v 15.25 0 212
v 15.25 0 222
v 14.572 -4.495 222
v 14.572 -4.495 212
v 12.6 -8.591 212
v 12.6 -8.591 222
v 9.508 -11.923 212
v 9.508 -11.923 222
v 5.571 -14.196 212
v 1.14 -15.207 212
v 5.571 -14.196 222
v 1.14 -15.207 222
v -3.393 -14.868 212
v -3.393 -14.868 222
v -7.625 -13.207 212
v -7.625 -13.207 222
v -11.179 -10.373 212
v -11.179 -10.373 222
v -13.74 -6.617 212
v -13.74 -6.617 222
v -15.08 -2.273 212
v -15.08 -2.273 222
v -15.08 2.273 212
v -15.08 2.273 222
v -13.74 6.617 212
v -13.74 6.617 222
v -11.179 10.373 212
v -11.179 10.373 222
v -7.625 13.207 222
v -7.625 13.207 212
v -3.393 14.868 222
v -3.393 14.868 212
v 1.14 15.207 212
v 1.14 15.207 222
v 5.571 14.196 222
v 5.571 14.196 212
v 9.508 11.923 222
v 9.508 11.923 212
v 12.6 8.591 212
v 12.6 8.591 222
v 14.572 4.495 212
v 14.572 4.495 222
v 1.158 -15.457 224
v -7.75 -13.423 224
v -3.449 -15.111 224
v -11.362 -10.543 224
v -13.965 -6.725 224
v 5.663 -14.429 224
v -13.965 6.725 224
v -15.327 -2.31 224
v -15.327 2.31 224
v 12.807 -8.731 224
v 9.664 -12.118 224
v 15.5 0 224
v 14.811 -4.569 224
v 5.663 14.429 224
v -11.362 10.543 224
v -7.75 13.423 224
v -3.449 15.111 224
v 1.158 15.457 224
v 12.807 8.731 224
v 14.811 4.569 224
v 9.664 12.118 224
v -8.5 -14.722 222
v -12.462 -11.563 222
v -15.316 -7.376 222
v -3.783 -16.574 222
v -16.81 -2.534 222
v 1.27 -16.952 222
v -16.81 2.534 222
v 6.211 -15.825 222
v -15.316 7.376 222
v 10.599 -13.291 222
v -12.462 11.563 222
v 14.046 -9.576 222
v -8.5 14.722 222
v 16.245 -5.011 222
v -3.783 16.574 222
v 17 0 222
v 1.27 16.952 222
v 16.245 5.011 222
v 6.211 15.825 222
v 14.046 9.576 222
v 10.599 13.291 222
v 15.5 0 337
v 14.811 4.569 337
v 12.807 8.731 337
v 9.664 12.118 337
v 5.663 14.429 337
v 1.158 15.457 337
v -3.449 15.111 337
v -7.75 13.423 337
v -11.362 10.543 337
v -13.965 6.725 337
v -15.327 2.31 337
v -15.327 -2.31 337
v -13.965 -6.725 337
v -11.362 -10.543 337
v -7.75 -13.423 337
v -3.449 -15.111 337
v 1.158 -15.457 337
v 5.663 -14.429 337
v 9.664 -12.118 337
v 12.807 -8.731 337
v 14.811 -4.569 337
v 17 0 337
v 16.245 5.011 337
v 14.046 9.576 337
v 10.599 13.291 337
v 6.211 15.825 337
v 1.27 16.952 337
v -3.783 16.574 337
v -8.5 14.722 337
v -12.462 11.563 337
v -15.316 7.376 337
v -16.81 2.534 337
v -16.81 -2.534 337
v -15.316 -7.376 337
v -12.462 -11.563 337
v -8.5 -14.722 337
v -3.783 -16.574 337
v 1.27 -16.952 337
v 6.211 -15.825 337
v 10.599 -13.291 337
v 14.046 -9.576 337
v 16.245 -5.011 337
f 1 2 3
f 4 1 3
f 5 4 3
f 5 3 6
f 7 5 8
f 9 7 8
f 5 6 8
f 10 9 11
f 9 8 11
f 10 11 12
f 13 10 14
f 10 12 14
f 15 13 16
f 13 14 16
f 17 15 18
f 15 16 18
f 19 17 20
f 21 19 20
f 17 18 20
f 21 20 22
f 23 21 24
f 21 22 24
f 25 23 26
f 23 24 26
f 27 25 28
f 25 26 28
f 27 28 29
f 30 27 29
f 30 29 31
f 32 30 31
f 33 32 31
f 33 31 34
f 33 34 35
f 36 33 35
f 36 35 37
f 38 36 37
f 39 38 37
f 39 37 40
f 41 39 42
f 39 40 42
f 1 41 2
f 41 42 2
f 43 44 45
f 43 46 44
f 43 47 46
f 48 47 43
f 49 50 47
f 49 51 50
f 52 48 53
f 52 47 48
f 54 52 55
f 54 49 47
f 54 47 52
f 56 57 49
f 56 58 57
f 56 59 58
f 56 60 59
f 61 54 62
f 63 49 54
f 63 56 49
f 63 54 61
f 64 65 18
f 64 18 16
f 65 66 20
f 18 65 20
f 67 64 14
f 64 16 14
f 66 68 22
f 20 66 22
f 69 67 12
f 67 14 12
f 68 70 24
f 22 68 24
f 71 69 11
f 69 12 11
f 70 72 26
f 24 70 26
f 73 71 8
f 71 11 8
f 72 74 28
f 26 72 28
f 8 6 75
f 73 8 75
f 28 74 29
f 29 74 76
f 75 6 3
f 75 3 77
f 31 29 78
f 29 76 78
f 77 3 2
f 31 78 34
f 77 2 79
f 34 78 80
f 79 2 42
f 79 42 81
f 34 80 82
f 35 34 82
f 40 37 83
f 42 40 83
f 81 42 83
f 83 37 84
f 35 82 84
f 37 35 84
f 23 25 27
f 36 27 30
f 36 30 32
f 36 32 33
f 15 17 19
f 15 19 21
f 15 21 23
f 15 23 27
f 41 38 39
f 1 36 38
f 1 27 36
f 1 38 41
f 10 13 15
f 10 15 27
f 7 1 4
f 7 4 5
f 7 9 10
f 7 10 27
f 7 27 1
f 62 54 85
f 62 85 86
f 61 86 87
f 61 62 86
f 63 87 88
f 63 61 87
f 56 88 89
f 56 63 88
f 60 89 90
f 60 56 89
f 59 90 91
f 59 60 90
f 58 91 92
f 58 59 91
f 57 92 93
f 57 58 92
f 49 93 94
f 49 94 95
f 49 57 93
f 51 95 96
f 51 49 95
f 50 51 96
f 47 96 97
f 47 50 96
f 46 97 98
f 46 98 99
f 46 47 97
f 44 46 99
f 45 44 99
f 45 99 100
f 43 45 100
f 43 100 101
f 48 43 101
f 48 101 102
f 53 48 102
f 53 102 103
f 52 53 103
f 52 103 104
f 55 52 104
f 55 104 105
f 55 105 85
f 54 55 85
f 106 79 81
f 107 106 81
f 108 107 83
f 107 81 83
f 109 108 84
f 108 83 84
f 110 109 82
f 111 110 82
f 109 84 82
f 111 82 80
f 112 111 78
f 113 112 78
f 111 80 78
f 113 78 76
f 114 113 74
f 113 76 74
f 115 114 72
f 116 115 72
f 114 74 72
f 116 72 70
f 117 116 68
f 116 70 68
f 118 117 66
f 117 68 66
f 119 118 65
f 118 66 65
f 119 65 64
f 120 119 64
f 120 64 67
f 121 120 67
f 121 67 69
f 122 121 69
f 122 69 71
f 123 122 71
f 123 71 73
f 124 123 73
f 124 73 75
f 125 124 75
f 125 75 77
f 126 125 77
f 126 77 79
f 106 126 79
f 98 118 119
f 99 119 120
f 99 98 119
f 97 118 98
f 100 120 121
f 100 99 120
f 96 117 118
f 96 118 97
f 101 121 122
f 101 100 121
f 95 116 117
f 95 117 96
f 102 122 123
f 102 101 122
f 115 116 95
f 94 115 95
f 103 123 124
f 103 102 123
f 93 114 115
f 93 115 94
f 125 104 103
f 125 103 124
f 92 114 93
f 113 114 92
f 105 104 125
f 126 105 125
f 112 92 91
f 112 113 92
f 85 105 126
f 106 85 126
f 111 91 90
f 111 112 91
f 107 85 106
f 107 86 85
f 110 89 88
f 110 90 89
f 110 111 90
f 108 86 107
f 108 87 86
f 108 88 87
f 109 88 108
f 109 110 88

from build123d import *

# Parameters (mm, degrees)
F1_R     = 17
F1_R_2   = 15.5
F2_DEPTH = 115
F3_R     = 17
F4_DEPTH = 2
F5_R     = 15.25
F6_DEPTH = 10


with BuildPart() as f2:
    # F1 (on offset) → F2 (new body)
    with BuildSketch(Plane.XY.offset(222)):
        Circle(F1_R)
        Circle(F1_R_2, mode=Mode.SUBTRACT)
    extrude(amount=F2_DEPTH)

    # F3 (on offset) → F4 (join)
    with BuildSketch(Plane.XY.offset(222)):
        Circle(F3_R)
    extrude(amount=F4_DEPTH)

    # F5 (on face) → F6 (join)
    with BuildSketch(Plane(origin=(0, 0, 222), x_dir=(1, 0, 0), z_dir=(0, 0, -1))):
        Circle(F5_R)
    extrude(amount=F6_DEPTH)


solid = f2.part
